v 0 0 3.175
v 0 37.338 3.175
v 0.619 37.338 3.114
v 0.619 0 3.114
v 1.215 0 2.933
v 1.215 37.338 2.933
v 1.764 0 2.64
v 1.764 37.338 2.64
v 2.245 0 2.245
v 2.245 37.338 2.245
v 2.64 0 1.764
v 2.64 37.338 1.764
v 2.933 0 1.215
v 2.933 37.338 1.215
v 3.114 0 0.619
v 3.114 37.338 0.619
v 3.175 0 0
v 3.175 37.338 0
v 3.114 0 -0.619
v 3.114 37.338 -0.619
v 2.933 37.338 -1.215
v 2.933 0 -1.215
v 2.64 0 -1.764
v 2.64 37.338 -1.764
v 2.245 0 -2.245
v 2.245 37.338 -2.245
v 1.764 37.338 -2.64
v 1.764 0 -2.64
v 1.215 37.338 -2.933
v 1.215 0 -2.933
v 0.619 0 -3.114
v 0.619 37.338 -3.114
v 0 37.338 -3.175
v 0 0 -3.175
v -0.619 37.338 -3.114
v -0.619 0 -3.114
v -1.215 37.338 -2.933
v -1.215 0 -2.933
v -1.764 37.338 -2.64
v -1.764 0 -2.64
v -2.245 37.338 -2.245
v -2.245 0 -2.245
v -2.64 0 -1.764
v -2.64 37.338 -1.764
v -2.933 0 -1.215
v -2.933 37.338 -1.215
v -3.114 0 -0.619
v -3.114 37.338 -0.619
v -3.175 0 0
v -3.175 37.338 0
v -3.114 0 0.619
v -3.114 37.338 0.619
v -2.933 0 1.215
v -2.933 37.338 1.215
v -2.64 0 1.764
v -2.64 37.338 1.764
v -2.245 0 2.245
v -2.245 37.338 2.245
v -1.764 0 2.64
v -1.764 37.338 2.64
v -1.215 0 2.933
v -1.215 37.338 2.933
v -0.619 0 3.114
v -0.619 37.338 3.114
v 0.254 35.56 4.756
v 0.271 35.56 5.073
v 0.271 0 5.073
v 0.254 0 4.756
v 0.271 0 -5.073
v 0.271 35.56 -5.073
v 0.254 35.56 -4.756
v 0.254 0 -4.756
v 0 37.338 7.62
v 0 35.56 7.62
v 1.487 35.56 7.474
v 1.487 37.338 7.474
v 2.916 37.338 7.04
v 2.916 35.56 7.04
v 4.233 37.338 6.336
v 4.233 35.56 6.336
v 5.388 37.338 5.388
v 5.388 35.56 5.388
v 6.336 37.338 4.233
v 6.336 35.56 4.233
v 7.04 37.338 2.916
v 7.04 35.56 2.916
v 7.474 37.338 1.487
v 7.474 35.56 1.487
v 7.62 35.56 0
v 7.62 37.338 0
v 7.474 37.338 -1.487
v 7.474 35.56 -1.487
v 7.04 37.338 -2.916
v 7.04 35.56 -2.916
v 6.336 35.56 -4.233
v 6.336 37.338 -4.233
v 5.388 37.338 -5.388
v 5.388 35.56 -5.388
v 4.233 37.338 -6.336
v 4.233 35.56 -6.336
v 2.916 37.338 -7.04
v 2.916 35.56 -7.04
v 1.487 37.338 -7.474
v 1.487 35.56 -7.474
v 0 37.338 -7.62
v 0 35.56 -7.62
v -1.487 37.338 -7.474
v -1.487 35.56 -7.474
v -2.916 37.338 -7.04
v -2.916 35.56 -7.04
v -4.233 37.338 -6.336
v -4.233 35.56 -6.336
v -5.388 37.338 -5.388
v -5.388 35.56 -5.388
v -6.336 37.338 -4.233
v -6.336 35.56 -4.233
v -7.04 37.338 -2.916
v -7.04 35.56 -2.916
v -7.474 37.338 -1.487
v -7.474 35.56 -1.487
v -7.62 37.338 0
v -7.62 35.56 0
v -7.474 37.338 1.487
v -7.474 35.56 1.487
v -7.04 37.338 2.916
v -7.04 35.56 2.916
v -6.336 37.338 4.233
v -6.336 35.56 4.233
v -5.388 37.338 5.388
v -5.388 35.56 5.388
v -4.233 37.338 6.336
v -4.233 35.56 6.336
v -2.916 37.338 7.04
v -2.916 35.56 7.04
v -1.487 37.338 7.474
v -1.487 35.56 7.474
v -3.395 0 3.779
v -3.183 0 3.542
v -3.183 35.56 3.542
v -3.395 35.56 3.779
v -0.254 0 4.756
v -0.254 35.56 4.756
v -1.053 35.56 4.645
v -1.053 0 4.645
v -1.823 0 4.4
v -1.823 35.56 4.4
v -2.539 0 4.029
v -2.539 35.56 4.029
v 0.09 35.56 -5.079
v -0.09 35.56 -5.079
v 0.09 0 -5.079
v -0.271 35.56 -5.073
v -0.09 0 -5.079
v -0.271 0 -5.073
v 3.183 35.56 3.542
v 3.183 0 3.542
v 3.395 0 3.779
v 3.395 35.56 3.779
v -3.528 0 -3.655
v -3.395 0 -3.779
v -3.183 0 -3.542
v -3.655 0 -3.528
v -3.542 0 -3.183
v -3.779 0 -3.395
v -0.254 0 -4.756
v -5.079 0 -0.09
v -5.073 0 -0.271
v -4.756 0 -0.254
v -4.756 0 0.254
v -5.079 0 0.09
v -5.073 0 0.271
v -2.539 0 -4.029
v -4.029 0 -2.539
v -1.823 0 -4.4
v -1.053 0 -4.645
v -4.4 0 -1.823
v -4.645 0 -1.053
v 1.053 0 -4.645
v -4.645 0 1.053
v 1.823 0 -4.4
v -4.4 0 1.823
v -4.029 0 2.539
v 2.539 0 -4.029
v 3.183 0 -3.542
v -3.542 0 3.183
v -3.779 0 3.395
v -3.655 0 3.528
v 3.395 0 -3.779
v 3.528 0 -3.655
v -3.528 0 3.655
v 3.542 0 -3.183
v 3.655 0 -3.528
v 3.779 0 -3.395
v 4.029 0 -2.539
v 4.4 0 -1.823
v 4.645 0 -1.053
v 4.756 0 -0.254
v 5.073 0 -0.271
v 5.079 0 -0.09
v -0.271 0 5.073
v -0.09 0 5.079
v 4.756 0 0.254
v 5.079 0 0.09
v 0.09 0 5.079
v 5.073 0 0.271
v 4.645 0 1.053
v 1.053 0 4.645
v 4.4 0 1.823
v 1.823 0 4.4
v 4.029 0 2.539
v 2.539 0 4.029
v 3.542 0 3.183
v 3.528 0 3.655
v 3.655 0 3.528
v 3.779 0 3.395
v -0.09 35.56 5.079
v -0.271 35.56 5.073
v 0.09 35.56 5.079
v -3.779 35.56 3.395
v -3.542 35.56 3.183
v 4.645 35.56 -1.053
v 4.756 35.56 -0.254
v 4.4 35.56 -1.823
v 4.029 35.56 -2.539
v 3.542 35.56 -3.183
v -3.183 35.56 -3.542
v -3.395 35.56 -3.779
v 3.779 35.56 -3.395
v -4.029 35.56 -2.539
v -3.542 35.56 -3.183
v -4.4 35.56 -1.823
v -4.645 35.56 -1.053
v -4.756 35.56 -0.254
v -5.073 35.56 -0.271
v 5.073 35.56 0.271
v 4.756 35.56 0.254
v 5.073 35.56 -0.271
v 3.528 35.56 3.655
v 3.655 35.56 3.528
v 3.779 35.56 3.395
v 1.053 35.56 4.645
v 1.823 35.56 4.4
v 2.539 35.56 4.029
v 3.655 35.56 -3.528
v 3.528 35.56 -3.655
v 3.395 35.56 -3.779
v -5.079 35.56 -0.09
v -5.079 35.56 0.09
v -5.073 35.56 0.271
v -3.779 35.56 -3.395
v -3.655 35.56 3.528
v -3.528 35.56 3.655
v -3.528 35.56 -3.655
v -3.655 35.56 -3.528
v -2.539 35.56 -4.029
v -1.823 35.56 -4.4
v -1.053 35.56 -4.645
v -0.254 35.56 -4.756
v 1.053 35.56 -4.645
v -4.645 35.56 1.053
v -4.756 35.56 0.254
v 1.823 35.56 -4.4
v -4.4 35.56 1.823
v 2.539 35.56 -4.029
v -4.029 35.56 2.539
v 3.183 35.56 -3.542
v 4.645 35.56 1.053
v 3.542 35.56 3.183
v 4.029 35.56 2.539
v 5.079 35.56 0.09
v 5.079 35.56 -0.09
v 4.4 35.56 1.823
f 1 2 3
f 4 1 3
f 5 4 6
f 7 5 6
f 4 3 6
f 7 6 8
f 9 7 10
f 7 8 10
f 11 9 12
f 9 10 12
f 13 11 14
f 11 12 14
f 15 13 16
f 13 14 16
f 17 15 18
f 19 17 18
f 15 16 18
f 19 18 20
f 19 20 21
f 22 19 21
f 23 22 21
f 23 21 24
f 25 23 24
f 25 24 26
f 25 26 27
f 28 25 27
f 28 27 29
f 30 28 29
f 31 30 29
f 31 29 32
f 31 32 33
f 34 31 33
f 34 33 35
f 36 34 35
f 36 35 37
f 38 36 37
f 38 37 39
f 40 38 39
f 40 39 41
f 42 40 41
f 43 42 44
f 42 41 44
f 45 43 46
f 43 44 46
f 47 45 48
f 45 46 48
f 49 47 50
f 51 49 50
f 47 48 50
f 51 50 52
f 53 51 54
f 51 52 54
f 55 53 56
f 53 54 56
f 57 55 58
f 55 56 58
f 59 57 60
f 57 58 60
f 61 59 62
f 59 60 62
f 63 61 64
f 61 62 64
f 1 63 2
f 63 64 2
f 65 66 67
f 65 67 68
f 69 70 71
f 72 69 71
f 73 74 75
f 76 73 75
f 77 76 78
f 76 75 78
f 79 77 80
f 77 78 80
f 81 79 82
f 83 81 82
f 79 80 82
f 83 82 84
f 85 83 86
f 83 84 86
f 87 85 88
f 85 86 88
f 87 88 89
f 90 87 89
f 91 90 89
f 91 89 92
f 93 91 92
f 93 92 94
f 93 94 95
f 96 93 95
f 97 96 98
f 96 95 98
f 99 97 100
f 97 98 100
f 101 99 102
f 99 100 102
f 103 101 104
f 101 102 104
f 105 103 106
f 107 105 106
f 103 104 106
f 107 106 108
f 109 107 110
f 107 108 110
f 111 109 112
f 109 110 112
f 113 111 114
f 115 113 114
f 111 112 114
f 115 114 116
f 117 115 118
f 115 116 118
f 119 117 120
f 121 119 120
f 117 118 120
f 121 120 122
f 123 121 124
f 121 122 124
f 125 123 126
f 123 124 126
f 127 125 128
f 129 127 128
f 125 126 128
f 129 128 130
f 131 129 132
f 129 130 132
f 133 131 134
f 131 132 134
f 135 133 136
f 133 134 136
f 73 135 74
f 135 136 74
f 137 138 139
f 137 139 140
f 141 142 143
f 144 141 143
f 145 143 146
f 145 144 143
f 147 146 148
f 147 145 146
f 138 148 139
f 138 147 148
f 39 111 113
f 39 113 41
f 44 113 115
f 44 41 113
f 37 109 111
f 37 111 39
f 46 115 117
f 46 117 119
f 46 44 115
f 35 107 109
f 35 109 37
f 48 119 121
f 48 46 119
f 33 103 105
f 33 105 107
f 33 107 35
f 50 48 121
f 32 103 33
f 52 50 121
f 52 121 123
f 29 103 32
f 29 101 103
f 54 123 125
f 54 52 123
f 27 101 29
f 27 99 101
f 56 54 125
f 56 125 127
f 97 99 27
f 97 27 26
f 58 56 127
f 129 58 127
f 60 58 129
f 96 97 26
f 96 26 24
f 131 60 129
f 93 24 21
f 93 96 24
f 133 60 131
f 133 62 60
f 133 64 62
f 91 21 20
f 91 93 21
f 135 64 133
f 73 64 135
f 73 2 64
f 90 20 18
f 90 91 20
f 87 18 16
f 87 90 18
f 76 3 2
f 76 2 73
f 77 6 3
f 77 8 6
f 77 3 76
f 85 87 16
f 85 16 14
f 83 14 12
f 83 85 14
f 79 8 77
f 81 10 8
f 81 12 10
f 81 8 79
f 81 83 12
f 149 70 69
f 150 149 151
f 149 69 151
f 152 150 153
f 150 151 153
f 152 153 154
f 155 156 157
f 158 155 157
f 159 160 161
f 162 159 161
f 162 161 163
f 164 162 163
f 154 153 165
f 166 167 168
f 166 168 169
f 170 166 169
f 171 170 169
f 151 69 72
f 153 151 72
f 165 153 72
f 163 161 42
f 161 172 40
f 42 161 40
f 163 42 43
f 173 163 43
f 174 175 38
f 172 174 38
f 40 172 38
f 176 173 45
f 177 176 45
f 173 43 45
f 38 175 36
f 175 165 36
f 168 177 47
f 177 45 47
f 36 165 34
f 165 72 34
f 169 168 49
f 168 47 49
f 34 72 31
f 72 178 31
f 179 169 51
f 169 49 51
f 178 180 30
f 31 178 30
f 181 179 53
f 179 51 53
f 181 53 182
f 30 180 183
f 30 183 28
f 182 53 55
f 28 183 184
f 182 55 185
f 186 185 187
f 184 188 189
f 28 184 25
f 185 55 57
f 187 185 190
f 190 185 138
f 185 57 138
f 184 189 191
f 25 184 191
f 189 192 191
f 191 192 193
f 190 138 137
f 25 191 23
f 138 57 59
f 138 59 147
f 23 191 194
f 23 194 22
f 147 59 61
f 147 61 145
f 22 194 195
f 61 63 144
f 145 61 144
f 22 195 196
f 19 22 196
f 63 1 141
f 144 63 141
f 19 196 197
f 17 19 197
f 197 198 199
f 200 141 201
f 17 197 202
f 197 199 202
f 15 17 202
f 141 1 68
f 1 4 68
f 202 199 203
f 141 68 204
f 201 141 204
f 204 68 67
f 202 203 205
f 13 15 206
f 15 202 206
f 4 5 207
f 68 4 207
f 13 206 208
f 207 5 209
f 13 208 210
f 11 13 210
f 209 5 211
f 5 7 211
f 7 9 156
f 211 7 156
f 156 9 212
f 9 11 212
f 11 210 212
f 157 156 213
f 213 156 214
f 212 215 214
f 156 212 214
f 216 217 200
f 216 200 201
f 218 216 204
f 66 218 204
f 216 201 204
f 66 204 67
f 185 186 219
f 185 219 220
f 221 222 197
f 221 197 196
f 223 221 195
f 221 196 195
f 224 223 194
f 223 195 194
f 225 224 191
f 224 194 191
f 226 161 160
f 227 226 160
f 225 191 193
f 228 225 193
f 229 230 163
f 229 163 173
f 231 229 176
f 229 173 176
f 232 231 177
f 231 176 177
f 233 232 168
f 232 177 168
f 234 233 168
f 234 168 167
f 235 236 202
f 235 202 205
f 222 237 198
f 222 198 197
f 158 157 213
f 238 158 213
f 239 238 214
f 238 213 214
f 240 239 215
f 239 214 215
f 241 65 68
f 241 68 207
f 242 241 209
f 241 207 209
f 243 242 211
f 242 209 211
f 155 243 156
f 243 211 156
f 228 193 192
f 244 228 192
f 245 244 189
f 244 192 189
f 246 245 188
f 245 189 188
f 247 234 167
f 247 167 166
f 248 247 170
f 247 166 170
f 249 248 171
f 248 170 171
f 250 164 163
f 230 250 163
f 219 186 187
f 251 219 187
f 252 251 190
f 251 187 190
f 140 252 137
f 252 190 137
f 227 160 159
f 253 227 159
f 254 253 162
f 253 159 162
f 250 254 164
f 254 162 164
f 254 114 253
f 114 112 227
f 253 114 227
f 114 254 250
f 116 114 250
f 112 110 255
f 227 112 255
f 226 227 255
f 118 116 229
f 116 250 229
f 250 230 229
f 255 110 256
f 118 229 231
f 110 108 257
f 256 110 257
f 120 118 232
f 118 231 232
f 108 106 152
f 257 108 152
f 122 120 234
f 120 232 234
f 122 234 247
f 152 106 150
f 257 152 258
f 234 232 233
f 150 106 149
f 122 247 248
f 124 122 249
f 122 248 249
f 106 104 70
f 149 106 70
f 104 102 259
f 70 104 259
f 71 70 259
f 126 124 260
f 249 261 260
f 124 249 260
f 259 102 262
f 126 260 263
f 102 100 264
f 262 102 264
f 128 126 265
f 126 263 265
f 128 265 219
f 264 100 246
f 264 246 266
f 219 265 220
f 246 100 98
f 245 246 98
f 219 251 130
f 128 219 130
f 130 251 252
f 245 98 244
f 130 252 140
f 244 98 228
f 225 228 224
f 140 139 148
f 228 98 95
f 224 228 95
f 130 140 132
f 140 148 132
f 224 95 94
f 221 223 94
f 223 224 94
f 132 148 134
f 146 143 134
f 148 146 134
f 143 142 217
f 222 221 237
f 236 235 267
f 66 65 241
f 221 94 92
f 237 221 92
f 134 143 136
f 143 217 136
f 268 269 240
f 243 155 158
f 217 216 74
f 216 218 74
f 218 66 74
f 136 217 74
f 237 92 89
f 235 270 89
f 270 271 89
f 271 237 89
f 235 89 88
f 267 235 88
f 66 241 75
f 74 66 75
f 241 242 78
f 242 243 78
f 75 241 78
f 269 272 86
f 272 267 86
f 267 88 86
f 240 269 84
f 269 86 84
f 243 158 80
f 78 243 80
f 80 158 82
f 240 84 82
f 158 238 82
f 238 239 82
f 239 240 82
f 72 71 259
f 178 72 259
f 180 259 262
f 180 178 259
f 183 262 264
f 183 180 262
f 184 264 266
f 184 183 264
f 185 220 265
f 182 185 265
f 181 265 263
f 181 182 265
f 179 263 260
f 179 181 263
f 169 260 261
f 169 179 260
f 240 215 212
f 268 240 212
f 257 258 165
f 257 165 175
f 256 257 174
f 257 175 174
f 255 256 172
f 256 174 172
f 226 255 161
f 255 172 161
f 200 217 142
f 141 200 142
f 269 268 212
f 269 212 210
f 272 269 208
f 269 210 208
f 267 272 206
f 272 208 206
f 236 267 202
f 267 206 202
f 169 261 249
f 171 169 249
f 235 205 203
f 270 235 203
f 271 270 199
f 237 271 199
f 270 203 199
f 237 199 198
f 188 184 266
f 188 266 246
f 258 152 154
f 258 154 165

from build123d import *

# Parameters (mm, degrees)
SKETCH2_R           = 5.08
BOSS_EXTRUDE1_DEPTH = 35.56
SKETCH4_R           = 7.62
BOSS_EXTRUDE2_DEPTH = 1.778
SKETCH5_R           = 3.175
CUT_EXTRUDE2_DEPTH  = 39.862
CUT_EXTRUDE3_DEPTH  = 35.56


with BuildPart() as part:
    # Sketch2 → Boss-Extrude1 (new body)
    with BuildSketch(Plane(origin=(0, 0, 0), x_dir=(1, 0, 0), z_dir=(0, 1, 0))):
        with Locations(Location((0, 0, 0), (0, 0, 270))):
            Circle(SKETCH2_R)
    extrude(amount=BOSS_EXTRUDE1_DEPTH)

    # Sketch4 → Boss-Extrude2 (add)
    with BuildSketch(Plane(origin=(0, 35.56, 0), x_dir=(1, 0, 0), z_dir=(0, 1, 0))):
        with Locations(Location((0, 0, 0), (0, 0, 270))):
            Circle(SKETCH4_R)
    extrude(amount=BOSS_EXTRUDE2_DEPTH)

    # Sketch5 → Cut-Extrude2 (cut, through all)
    with BuildSketch(Plane(origin=(0, 37.338, 0), x_dir=(1, 0, 0), z_dir=(0, 1, 0))):
        with Locations(Location((0, 0, 0), (0, 0, 270))):
            Circle(SKETCH5_R)
    extrude(amount=-CUT_EXTRUDE2_DEPTH, mode=Mode.SUBTRACT)

    # Sketch6 → Cut-Extrude3 (cut)
    with BuildSketch(Plane.XZ):
        with BuildLine():
            Line((-3.77856884, 3.395411245), (-3.542408287, 3.183198042))
            ThreePointArc((-3.542408287, 3.183198042), (-4.399976274, 1.822529847), (-4.755721843, 0.254))
            Line((-4.755721843, 0.254), (-5.072769966, 0.270933333))
            ThreePointArc((-5.072769966, 0.270933333), (-4.693308025, 1.944031836), (-3.77856884, 3.395411245))
        make_face()
        with BuildLine():
            Line((-0.270933333, 5.072769966), (-0.254, 4.755721843))
            ThreePointArc((-0.254, 4.755721843), (-1.822529847, 4.399976274), (-3.183198042, 3.542408287))
            Line((-3.183198042, 3.542408287), (-3.395411245, 3.77856884))
            ThreePointArc((-3.395411245, 3.77856884), (-1.944031836, 4.693308025), (-0.270933333, 5.072769966))
        make_face()
        with BuildLine():
            Line((0.270933333, 5.072769966), (0.254, 4.755721843))
            ThreePointArc((0.254, 4.755721843), (1.822529847, 4.399976274), (3.183198042, 3.542408287))
            Line((3.183198042, 3.542408287), (3.395411245, 3.77856884))
            ThreePointArc((3.395411245, 3.77856884), (1.944031836, 4.693308025), (0.270933333, 5.072769966))
        make_face()
        with BuildLine():
            Line((3.77856884, 3.395411245), (3.542408287, 3.183198042))
            ThreePointArc((3.542408287, 3.183198042), (4.399976274, 1.822529847), (4.755721843, 0.254))
            Line((4.755721843, 0.254), (5.072769966, 0.270933333))
            ThreePointArc((5.072769966, 0.270933333), (4.693308025, 1.944031836), (3.77856884, 3.395411245))
        make_face()
        with BuildLine():
            Line((5.072769966, -0.270933333), (4.755721843, -0.254))
            ThreePointArc((4.755721843, -0.254), (4.399976274, -1.822529847), (3.542408287, -3.183198042))
            Line((3.542408287, -3.183198042), (3.77856884, -3.395411245))
            ThreePointArc((3.77856884, -3.395411245), (4.693308025, -1.944031836), (5.072769966, -0.270933333))
        make_face()
        with BuildLine():
            Line((3.183198042, -3.542408287), (3.395411245, -3.77856884))
            ThreePointArc((3.395411245, -3.77856884), (1.944031836, -4.693308025), (0.270933333, -5.072769966))
            Line((0.270933333, -5.072769966), (0.254, -4.755721843))
            ThreePointArc((0.254, -4.755721843), (1.822529847, -4.399976274), (3.183198042, -3.542408287))
        make_face()
        with BuildLine():
            Line((-4.755721843, -0.254), (-5.072769966, -0.270933333))
            ThreePointArc((-5.072769966, -0.270933333), (-4.693308025, -1.944031836), (-3.77856884, -3.395411245))
            Line((-3.77856884, -3.395411245), (-3.542408287, -3.183198042))
            ThreePointArc((-3.542408287, -3.183198042), (-4.399976274, -1.822529847), (-4.755721843, -0.254))
        make_face()
        with BuildLine():
            Line((-3.183198042, -3.542408287), (-3.395411245, -3.77856884))
            ThreePointArc((-3.395411245, -3.77856884), (-1.944031836, -4.693308025), (-0.270933333, -5.072769966))
            Line((-0.270933333, -5.072769966), (-0.254, -4.755721843))
            ThreePointArc((-0.254, -4.755721843), (-1.822529847, -4.399976274), (-3.183198042, -3.542408287))
        make_face()
    extrude(amount=-CUT_EXTRUDE3_DEPTH, mode=Mode.SUBTRACT)


solid = part.part
